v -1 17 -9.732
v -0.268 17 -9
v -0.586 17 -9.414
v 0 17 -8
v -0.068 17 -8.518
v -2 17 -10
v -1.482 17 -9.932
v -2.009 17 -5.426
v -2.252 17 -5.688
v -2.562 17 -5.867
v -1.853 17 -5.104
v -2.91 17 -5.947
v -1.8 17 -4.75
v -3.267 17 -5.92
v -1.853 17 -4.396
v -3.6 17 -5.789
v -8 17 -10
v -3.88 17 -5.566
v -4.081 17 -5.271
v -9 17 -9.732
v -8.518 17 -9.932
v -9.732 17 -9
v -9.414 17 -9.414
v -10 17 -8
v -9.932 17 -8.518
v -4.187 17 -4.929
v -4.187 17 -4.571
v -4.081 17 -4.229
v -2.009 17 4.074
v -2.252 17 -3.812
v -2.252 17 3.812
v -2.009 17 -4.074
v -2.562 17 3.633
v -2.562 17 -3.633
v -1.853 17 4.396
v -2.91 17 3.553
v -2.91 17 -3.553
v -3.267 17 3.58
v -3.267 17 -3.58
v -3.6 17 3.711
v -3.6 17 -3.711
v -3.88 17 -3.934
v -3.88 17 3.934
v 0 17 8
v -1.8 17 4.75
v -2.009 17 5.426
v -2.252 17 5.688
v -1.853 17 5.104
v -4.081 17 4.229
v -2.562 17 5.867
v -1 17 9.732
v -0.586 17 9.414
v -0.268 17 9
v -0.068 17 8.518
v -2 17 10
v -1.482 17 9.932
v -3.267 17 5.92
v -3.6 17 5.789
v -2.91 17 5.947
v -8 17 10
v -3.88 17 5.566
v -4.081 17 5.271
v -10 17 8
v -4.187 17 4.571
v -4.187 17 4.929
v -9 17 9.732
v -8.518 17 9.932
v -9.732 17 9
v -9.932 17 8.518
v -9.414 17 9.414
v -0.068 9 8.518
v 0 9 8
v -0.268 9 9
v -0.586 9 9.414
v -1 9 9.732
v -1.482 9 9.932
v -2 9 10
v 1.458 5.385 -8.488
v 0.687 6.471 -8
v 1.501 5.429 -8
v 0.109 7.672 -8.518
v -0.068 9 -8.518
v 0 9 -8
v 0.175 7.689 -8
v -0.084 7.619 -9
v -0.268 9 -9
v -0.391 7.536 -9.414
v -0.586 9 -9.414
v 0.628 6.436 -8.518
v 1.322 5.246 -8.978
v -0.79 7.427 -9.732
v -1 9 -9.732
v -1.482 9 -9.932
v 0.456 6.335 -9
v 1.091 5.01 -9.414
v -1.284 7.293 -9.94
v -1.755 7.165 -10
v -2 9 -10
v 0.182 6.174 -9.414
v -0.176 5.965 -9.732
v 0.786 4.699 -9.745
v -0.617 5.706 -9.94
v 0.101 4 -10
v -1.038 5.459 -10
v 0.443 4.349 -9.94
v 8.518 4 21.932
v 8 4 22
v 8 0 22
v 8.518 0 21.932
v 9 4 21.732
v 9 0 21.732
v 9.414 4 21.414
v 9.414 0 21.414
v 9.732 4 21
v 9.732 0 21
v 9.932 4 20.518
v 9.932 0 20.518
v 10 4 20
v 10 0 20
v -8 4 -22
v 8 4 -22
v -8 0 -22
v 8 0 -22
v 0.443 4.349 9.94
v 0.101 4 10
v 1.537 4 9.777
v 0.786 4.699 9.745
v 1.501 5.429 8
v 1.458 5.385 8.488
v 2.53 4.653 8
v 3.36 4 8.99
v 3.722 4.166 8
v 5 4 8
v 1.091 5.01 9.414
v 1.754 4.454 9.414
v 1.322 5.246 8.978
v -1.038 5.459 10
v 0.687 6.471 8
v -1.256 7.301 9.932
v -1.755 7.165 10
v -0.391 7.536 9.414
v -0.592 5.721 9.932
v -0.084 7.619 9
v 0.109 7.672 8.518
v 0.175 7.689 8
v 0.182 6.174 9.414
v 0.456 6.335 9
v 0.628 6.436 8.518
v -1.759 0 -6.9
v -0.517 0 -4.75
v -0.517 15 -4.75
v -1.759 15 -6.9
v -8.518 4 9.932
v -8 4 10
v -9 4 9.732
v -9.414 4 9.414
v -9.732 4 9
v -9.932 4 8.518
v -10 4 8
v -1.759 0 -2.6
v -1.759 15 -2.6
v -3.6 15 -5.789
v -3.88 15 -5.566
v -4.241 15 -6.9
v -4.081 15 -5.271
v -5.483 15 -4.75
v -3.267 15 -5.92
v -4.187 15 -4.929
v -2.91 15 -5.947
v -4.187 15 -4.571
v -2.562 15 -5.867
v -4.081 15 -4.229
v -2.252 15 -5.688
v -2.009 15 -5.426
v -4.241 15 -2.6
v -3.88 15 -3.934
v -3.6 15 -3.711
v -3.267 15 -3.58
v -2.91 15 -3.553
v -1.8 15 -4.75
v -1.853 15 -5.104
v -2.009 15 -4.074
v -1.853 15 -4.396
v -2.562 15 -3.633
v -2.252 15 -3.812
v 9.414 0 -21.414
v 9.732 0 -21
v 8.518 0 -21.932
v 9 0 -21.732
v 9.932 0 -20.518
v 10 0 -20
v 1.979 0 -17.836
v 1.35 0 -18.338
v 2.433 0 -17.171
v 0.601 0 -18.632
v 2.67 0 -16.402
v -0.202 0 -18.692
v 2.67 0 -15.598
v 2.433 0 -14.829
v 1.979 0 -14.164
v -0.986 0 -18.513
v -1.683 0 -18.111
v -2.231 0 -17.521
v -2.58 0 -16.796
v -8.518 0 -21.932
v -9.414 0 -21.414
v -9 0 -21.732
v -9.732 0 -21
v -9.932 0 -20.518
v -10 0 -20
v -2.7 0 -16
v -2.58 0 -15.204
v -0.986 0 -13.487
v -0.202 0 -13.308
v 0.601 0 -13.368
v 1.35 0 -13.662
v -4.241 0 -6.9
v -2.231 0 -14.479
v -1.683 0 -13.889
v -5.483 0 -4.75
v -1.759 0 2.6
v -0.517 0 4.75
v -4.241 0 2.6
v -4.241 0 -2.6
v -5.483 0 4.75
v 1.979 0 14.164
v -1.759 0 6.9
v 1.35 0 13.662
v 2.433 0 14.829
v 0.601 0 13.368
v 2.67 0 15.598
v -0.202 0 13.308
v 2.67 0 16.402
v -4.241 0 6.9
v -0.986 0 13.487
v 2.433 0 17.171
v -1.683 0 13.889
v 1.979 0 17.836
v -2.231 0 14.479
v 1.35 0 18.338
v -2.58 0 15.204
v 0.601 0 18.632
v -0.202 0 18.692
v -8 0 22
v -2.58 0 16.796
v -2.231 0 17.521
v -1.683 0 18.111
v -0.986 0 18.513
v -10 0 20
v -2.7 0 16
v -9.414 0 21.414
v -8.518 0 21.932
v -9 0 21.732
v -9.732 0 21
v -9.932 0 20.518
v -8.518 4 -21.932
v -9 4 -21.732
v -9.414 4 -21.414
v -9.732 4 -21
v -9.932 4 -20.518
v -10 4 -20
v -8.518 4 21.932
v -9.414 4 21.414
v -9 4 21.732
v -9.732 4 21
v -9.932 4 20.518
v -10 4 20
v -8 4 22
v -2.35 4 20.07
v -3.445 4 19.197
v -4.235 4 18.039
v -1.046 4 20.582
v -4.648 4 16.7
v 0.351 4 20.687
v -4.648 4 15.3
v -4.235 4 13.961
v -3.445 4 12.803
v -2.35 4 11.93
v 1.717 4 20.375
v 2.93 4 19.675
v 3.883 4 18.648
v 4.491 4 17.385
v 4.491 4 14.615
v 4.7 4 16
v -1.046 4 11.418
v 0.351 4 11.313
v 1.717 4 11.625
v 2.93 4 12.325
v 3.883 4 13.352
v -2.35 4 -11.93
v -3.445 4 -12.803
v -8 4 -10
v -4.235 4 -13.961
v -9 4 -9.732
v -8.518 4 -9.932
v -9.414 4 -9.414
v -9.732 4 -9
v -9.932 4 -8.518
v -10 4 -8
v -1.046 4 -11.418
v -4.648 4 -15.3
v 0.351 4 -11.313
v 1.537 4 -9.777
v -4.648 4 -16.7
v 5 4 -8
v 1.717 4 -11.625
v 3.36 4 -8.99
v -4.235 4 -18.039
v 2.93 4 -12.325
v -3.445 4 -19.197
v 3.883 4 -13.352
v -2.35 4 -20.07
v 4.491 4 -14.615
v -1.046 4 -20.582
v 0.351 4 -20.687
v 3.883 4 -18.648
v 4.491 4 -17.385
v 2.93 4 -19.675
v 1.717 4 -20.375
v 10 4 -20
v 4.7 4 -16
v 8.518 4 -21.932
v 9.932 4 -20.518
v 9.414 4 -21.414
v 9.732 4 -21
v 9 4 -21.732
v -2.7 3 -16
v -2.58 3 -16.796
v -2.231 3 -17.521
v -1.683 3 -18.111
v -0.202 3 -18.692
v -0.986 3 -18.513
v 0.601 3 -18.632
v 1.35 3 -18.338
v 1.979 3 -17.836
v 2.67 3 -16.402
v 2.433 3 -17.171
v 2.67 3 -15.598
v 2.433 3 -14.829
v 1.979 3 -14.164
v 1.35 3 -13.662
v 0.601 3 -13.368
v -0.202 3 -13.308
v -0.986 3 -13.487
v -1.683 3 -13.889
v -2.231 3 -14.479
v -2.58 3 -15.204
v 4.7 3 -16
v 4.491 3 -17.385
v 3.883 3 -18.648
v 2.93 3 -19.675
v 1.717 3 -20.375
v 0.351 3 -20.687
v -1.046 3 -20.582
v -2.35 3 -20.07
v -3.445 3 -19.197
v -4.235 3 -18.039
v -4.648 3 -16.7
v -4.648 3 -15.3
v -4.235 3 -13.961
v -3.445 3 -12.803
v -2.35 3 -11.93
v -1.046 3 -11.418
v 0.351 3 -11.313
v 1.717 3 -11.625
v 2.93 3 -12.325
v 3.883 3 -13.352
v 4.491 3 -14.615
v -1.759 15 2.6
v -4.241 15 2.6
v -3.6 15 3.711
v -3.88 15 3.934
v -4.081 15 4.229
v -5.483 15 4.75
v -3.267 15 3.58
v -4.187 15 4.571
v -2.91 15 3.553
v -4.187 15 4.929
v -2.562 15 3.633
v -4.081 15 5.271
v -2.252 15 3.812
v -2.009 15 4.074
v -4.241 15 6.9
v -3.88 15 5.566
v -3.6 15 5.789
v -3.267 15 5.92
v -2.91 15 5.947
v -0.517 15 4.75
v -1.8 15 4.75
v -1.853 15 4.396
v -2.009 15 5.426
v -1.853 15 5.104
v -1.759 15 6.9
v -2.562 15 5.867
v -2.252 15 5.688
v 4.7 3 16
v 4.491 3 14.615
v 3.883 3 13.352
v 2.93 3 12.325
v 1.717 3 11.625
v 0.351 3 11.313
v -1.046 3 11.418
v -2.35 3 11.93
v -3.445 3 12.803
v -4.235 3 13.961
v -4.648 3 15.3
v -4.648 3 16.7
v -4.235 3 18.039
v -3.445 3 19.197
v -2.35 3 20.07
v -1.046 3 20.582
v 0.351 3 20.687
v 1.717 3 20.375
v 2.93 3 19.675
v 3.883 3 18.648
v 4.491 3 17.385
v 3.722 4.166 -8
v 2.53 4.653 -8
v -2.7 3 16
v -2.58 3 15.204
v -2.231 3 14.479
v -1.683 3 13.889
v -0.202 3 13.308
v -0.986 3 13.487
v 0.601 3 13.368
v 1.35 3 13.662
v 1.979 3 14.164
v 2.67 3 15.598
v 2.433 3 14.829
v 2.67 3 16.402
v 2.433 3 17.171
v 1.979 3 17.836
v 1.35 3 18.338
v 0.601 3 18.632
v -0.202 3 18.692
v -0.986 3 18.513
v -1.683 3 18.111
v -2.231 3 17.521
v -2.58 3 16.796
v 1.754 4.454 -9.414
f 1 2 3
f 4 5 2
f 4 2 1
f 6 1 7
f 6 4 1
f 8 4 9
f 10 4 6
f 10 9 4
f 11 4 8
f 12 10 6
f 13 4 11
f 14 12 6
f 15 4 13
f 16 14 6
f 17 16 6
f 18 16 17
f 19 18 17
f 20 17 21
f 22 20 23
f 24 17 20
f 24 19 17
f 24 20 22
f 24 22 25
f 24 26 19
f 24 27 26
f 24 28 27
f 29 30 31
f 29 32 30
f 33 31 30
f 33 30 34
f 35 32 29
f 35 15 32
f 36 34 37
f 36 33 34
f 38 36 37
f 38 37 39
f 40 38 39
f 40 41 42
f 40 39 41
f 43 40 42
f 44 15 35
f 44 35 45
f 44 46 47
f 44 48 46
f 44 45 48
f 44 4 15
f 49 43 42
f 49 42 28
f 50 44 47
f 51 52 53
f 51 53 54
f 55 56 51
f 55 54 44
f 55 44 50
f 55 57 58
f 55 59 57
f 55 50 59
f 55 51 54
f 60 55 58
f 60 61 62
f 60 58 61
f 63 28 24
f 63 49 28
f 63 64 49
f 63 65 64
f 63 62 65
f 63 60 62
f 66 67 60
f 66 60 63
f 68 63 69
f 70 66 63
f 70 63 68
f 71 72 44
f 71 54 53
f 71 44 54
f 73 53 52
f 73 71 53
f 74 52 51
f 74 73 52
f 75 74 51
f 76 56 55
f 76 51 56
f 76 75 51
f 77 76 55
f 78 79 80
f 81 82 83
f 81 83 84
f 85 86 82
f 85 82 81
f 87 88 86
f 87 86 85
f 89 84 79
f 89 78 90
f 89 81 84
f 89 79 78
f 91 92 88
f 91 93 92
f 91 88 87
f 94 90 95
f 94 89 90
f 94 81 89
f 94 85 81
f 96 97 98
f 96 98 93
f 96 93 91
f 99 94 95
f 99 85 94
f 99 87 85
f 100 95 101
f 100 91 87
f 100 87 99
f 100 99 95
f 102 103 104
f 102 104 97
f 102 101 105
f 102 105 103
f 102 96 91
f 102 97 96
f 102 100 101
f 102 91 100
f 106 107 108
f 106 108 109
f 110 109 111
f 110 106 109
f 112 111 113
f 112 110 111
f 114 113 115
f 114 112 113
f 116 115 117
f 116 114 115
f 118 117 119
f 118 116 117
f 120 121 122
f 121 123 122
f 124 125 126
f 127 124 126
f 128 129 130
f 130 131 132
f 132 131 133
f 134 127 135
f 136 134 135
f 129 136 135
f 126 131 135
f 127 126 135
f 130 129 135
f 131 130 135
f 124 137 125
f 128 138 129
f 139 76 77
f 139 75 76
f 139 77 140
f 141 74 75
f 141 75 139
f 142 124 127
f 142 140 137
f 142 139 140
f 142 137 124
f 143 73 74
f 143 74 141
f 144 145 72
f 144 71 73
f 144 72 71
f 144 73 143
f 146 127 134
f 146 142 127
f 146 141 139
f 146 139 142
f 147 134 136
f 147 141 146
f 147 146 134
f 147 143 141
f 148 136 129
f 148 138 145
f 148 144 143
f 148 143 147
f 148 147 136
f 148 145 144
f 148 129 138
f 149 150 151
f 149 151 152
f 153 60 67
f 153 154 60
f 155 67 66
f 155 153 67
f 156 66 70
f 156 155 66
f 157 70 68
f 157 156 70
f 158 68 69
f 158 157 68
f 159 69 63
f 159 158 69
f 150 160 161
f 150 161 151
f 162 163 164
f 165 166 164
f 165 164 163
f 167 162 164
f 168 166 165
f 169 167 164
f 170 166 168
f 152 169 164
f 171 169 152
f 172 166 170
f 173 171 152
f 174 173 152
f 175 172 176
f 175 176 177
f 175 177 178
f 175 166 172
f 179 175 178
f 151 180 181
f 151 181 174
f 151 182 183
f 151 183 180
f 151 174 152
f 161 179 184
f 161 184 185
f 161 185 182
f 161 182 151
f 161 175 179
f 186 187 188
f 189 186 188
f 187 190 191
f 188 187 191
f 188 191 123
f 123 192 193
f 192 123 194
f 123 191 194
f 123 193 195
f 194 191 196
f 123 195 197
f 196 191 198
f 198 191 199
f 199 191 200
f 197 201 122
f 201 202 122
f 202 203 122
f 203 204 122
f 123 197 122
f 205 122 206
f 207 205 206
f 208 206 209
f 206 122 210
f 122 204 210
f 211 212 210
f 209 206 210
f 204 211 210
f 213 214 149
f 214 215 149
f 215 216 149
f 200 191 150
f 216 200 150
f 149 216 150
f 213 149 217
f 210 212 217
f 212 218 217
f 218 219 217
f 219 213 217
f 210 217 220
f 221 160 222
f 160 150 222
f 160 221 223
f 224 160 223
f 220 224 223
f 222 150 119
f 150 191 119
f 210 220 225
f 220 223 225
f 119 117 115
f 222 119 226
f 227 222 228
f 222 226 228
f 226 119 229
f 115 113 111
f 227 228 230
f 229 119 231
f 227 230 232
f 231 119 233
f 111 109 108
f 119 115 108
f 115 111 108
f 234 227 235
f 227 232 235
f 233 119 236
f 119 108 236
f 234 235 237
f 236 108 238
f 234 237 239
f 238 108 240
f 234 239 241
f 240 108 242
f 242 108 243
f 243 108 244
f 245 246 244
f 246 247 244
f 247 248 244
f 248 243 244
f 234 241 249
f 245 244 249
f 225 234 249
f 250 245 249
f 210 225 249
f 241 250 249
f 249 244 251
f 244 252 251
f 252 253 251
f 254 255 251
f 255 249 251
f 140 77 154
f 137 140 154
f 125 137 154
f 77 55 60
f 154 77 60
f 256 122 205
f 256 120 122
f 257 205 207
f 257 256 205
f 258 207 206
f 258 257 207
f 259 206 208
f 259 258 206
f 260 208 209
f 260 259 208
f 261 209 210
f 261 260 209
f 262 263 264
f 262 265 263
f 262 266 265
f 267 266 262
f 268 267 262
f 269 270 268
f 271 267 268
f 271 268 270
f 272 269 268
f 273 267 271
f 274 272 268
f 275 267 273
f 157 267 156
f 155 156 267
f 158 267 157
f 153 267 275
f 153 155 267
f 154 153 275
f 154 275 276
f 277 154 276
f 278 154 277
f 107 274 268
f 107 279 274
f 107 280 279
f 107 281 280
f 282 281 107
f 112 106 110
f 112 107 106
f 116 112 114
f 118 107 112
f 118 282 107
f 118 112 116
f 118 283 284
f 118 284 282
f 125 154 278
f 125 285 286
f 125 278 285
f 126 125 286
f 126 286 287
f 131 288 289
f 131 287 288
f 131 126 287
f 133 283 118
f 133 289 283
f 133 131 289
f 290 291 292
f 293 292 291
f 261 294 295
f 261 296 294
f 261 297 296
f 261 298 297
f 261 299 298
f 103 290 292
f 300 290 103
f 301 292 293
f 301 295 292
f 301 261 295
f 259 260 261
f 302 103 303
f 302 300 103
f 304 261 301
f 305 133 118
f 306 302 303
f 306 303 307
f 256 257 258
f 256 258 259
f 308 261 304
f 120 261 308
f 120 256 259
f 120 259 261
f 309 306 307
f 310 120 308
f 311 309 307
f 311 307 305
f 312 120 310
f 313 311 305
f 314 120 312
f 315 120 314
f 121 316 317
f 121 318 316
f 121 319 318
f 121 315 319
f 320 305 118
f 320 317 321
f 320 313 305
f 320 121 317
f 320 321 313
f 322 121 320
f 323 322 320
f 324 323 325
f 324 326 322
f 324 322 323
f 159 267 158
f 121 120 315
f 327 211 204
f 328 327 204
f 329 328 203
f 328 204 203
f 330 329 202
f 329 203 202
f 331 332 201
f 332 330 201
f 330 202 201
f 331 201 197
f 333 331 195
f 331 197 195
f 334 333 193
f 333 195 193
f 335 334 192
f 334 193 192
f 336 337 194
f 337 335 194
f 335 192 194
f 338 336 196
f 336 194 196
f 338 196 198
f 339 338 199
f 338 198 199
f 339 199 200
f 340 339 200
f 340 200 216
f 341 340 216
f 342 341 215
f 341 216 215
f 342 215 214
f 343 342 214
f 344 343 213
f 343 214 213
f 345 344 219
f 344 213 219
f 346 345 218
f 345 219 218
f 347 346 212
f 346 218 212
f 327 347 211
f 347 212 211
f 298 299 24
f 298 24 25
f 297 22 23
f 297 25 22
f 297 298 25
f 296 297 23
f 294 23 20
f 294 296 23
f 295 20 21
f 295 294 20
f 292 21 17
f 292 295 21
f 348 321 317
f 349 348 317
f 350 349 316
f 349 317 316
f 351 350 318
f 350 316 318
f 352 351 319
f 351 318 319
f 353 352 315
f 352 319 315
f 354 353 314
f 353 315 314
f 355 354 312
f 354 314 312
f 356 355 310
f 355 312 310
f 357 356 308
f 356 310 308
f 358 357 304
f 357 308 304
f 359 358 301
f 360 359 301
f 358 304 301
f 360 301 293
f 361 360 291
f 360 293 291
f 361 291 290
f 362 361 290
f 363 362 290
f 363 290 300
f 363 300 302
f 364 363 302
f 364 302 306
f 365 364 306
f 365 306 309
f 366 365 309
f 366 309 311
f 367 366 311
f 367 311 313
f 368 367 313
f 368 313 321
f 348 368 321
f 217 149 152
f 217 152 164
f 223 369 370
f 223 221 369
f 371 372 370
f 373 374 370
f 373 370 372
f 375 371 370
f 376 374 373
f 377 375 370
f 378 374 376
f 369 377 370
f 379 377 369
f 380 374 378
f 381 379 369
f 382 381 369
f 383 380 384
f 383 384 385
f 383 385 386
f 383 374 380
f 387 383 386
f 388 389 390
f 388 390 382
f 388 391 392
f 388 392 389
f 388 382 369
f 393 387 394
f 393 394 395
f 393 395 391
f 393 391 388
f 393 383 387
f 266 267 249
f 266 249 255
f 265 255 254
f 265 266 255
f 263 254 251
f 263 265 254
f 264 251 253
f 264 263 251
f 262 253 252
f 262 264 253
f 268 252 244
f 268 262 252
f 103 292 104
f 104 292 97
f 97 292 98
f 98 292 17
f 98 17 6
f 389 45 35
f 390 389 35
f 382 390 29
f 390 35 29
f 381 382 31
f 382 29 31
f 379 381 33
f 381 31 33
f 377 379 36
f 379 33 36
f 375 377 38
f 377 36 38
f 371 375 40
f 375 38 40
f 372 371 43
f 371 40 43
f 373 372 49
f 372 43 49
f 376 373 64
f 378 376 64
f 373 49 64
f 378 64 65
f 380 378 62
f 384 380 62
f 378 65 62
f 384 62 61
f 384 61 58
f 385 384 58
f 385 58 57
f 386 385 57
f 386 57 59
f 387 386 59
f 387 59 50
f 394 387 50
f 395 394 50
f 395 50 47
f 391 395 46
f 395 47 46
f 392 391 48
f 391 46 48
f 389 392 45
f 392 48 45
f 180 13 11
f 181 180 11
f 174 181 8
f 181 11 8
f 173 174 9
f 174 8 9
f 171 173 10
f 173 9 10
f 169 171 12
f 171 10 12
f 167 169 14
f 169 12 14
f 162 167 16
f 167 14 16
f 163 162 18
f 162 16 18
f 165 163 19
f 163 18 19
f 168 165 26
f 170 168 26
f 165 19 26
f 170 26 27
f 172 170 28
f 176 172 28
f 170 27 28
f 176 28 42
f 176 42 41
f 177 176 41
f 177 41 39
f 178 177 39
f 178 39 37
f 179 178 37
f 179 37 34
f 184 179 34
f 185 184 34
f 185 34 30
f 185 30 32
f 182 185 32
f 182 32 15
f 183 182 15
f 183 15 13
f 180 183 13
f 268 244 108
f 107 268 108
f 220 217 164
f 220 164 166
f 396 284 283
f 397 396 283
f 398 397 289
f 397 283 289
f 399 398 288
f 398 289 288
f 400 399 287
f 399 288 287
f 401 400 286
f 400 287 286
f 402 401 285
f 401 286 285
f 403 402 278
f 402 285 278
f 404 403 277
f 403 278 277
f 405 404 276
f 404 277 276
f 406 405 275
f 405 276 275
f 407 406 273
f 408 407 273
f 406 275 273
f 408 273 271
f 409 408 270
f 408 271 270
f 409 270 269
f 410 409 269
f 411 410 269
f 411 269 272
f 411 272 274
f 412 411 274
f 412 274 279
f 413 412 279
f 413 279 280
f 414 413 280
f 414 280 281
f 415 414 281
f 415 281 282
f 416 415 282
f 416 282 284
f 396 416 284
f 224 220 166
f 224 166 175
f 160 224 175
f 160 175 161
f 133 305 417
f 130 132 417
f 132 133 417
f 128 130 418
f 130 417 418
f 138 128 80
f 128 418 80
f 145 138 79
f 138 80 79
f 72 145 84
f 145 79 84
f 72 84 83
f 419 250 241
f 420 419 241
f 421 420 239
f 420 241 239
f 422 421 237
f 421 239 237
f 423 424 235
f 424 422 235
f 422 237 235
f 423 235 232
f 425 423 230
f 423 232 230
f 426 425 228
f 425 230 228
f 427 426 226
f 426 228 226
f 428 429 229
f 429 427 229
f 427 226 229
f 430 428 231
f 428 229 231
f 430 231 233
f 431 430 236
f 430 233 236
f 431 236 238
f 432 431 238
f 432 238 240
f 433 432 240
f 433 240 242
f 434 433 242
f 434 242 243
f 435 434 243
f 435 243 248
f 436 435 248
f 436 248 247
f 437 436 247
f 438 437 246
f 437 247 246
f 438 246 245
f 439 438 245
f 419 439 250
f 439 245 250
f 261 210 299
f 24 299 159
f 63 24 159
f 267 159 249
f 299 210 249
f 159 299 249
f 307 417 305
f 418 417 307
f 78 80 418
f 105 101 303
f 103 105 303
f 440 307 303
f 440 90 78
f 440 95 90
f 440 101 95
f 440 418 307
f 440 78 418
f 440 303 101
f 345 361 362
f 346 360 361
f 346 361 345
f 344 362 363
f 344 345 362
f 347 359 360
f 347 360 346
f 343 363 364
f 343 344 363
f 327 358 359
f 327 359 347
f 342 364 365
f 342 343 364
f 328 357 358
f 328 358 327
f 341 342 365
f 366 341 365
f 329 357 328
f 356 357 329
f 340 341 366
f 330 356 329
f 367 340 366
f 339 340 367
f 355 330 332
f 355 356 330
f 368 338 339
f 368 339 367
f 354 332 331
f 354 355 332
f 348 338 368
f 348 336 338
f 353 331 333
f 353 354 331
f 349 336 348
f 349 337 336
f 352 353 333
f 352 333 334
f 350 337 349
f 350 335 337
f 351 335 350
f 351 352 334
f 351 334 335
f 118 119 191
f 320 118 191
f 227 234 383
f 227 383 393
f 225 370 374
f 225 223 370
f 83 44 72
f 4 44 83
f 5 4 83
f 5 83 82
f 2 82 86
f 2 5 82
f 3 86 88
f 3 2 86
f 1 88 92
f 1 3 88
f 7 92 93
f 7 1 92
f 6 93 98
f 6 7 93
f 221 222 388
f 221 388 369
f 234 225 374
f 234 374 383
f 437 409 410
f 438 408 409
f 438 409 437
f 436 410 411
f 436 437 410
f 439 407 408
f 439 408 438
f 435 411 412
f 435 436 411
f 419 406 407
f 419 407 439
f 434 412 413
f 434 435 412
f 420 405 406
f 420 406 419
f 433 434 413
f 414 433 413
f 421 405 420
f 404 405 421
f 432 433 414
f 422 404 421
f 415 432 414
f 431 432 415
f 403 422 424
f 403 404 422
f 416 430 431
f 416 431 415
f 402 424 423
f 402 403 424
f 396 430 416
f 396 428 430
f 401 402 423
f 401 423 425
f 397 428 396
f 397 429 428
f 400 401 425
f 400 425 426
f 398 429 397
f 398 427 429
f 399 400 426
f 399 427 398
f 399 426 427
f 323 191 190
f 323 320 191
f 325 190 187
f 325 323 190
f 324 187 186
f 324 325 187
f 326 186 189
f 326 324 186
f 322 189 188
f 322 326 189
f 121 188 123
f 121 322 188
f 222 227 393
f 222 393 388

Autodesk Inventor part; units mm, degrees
ref_plane "YZ Plane" through (0, 0, 0) normal (1, 0, 0) x (0, 1, 0)
ref_plane "XZ Plane" through (0, 0, 0) normal (0, 1, 0) x (-1, 0, 0)
ref_plane "XY Plane" through (0, 0, 0) normal (0, 0, 1) x (1, 0, 0)
sketch "Boceto1" plane through (0, 0, 0) normal (0, 1, 0) x (-1, 0, 0)
  line L0 (-10, 10) -> (10, 10)
  line L1 (10, 10) -> (10, -10)
  line L2 (10, -10) -> (-10, -10)
  line L3 (-10, -10) -> (-10, 10)
  line L4 (-10, 10) -> (10, -10) construction
  line L5 (10, 10) -> (-10, -10) construction
  line L6 (10, 22) -> (-10, 22)
  line L7 (-10, 22) -> (-10, -22)
  line L8 (-10, -22) -> (10, -22)
  line L9 (10, -22) -> (10, 22)
  circle A0 centre (0, 16) radius 2.7
  circle A1 centre (0, -16) radius 2.7
  point P0 (0, 0)
  dimension "d0" = 20
  dimension "d1" = 20
  dimension "d2" = 5.4
  dimension "d3" = 5.4
  dimension "d4" = 6
  dimension "d5" = 6
  dimension "d6" = 6
  dimension "d7" = 6
extrude "Extrusión1" add sketch "Boceto1" along normal blind 17
sketch "Boceto2" plane through (0, 17, 0) normal (0, 1, 0) x (1, 0, 0)
  circle A0 centre (-3, -4.75) radius 1.2
  circle A1 centre (-3, 4.75) radius 1.2
  line L0 (-10, 22) -> (-10, -22) projected
  point P0 (0, 0)
  dimension "d10" = 2.4
  dimension "d11" = 9.5
  dimension "d12" = 4.75
  dimension "d13" = 7
extrude "Extrusión2" cut sketch "Boceto2" against normal through all
sketch "Boceto3" plane through (0, 17, 0) normal (0, 1, 0) x (1, 0, 0)
  line L0 (-10, 22) -> (-10, -22) projected
  line L1 (10, -10) -> (-10, -10)
  line L2 (-10, -10) -> (-10, 10)
  line L3 (-10, 10) -> (10, 10)
  line L4 (10, 10) -> (10, -10)
  line L5 (10, -10) -> (-10, 10) construction
  line L6 (-10, -10) -> (10, 10) construction
  circle A0 centre (-3, 4.75) radius 1.2 projected
  circle A1 centre (-3, -4.75) radius 1.2 projected
  line L7 (10, -22) -> (10, 22) projected
  line L8 (10, 22) -> (-10, 22) projected
  line L9 (-10, 22) -> (-10, -22) projected
  line L10 (-10, -22) -> (10, -22) projected
  circle A2 centre (0, -16) radius 2.7 projected
  circle A3 centre (0, 16) radius 2.7 projected
  point P0 (0, 0)
  point P1 (-10, -22)
  point P2 (-10, -10)
  dimension "d16" = 20
extrude "Extrusión3" cut sketch "Boceto3" against normal blind 13 contours L8 L7 L3 L0 | L1 L7 L10 L0
sketch "Boceto4" plane through (0, 4, 0) normal (0, 1, 0) x (1, 0, 0)
  circle A0 centre (0, -16) radius 2.7 projected
  circle A1 centre (0, -16) radius 4.7
  circle A2 centre (0, 16) radius 2.7 projected
  circle A3 centre (0, 16) radius 4.7
  point P0 (0, 0)
  dimension "d19" = 9.4
extrude "Extrusión4" cut sketch "Boceto4" against normal blind 1
sketch "Boceto5" plane through (0, 17, 0) normal (0, 1, 0) x (1, 0, 0)
  line L0 (-10, -10) -> (10, -10) projected
  line L1 (10, 10) -> (-10, 10) projected
  line L2 (10, -10) -> (0, -10)
  line L3 (0, -10) -> (0, 10)
  line L4 (0, 10) -> (10, 10)
  line L5 (10, 10) -> (10, -10)
  point P0 (0, 0)
  point P1 (0, -10)
  dimension "d22" = 10
extrude "Extrusión5" cut sketch "Boceto5" against normal up to surface (13 mm away)
fillet "Empalme1" radius 2 4 edges at (10, 2, 22) (-10, 2, 22) (10, 2, -22) (-10, 2, -22)
fillet "Empalme2" radius 5 1 edges at (0, 4, 0)
fillet "Empalme3" radius 2 6 edges at (-10, 10.5, 10) (-10, 10.5, -10) (0, 13, 10) (0, 13, -10) (1.4645, 5.4645, -10) (1.4645, 5.4645, 10)
sketch "Boceto6" plane through (0, 0, 0) normal (0, -1, 0) x (1, 0, 0)
  circle A0 centre (-3, -4.75) radius 1.2 projected
  circle A1 centre (-3, -4.75) radius 2.15
  circle A2 centre (-3, 4.75) radius 1.2 projected
  circle A3 centre (-3, 4.75) radius 2.15
  line L0 (-5.4826, -4.75) -> (-4.2413, -2.6)
  line L1 (-4.2413, -2.6) -> (-1.7587, -2.6)
  line L2 (-1.7587, -2.6) -> (-0.5174, -4.75)
  line L3 (-0.5174, -4.75) -> (-1.7587, -6.9)
  line L4 (-1.7587, -6.9) -> (-4.2413, -6.9)
  line L5 (-4.2413, -6.9) -> (-5.4826, -4.75)
  line L6 (-5.4826, 4.75) -> (-4.2413, 6.9)
  line L7 (-4.2413, 6.9) -> (-1.7587, 6.9)
  line L8 (-1.7587, 6.9) -> (-0.5174, 4.75)
  line L9 (-0.5174, 4.75) -> (-1.7587, 2.6)
  line L10 (-1.7587, 2.6) -> (-4.2413, 2.6)
  line L11 (-4.2413, 2.6) -> (-5.4826, 4.75)
  point P0 (0, 0)
  dimension "d29" = 4.3
  dimension "d30" = 4.3
extrude "Extrusión6" cut sketch "Boceto6" against normal blind 15 contours A0 | A1 | A1 L2 L3 | A1 L1 L2 | L3 L4 A1 | A1 L0 L1 | L4 L5 A1 | A1 L5 L0 | A2 | A3 | A3 L8 L9 | A3 L7 L8 | L9 L10 A3 | A3 L6 L7 | L10 L11 A3 | A3 L11 L6
properties part number "soporteendstop"
